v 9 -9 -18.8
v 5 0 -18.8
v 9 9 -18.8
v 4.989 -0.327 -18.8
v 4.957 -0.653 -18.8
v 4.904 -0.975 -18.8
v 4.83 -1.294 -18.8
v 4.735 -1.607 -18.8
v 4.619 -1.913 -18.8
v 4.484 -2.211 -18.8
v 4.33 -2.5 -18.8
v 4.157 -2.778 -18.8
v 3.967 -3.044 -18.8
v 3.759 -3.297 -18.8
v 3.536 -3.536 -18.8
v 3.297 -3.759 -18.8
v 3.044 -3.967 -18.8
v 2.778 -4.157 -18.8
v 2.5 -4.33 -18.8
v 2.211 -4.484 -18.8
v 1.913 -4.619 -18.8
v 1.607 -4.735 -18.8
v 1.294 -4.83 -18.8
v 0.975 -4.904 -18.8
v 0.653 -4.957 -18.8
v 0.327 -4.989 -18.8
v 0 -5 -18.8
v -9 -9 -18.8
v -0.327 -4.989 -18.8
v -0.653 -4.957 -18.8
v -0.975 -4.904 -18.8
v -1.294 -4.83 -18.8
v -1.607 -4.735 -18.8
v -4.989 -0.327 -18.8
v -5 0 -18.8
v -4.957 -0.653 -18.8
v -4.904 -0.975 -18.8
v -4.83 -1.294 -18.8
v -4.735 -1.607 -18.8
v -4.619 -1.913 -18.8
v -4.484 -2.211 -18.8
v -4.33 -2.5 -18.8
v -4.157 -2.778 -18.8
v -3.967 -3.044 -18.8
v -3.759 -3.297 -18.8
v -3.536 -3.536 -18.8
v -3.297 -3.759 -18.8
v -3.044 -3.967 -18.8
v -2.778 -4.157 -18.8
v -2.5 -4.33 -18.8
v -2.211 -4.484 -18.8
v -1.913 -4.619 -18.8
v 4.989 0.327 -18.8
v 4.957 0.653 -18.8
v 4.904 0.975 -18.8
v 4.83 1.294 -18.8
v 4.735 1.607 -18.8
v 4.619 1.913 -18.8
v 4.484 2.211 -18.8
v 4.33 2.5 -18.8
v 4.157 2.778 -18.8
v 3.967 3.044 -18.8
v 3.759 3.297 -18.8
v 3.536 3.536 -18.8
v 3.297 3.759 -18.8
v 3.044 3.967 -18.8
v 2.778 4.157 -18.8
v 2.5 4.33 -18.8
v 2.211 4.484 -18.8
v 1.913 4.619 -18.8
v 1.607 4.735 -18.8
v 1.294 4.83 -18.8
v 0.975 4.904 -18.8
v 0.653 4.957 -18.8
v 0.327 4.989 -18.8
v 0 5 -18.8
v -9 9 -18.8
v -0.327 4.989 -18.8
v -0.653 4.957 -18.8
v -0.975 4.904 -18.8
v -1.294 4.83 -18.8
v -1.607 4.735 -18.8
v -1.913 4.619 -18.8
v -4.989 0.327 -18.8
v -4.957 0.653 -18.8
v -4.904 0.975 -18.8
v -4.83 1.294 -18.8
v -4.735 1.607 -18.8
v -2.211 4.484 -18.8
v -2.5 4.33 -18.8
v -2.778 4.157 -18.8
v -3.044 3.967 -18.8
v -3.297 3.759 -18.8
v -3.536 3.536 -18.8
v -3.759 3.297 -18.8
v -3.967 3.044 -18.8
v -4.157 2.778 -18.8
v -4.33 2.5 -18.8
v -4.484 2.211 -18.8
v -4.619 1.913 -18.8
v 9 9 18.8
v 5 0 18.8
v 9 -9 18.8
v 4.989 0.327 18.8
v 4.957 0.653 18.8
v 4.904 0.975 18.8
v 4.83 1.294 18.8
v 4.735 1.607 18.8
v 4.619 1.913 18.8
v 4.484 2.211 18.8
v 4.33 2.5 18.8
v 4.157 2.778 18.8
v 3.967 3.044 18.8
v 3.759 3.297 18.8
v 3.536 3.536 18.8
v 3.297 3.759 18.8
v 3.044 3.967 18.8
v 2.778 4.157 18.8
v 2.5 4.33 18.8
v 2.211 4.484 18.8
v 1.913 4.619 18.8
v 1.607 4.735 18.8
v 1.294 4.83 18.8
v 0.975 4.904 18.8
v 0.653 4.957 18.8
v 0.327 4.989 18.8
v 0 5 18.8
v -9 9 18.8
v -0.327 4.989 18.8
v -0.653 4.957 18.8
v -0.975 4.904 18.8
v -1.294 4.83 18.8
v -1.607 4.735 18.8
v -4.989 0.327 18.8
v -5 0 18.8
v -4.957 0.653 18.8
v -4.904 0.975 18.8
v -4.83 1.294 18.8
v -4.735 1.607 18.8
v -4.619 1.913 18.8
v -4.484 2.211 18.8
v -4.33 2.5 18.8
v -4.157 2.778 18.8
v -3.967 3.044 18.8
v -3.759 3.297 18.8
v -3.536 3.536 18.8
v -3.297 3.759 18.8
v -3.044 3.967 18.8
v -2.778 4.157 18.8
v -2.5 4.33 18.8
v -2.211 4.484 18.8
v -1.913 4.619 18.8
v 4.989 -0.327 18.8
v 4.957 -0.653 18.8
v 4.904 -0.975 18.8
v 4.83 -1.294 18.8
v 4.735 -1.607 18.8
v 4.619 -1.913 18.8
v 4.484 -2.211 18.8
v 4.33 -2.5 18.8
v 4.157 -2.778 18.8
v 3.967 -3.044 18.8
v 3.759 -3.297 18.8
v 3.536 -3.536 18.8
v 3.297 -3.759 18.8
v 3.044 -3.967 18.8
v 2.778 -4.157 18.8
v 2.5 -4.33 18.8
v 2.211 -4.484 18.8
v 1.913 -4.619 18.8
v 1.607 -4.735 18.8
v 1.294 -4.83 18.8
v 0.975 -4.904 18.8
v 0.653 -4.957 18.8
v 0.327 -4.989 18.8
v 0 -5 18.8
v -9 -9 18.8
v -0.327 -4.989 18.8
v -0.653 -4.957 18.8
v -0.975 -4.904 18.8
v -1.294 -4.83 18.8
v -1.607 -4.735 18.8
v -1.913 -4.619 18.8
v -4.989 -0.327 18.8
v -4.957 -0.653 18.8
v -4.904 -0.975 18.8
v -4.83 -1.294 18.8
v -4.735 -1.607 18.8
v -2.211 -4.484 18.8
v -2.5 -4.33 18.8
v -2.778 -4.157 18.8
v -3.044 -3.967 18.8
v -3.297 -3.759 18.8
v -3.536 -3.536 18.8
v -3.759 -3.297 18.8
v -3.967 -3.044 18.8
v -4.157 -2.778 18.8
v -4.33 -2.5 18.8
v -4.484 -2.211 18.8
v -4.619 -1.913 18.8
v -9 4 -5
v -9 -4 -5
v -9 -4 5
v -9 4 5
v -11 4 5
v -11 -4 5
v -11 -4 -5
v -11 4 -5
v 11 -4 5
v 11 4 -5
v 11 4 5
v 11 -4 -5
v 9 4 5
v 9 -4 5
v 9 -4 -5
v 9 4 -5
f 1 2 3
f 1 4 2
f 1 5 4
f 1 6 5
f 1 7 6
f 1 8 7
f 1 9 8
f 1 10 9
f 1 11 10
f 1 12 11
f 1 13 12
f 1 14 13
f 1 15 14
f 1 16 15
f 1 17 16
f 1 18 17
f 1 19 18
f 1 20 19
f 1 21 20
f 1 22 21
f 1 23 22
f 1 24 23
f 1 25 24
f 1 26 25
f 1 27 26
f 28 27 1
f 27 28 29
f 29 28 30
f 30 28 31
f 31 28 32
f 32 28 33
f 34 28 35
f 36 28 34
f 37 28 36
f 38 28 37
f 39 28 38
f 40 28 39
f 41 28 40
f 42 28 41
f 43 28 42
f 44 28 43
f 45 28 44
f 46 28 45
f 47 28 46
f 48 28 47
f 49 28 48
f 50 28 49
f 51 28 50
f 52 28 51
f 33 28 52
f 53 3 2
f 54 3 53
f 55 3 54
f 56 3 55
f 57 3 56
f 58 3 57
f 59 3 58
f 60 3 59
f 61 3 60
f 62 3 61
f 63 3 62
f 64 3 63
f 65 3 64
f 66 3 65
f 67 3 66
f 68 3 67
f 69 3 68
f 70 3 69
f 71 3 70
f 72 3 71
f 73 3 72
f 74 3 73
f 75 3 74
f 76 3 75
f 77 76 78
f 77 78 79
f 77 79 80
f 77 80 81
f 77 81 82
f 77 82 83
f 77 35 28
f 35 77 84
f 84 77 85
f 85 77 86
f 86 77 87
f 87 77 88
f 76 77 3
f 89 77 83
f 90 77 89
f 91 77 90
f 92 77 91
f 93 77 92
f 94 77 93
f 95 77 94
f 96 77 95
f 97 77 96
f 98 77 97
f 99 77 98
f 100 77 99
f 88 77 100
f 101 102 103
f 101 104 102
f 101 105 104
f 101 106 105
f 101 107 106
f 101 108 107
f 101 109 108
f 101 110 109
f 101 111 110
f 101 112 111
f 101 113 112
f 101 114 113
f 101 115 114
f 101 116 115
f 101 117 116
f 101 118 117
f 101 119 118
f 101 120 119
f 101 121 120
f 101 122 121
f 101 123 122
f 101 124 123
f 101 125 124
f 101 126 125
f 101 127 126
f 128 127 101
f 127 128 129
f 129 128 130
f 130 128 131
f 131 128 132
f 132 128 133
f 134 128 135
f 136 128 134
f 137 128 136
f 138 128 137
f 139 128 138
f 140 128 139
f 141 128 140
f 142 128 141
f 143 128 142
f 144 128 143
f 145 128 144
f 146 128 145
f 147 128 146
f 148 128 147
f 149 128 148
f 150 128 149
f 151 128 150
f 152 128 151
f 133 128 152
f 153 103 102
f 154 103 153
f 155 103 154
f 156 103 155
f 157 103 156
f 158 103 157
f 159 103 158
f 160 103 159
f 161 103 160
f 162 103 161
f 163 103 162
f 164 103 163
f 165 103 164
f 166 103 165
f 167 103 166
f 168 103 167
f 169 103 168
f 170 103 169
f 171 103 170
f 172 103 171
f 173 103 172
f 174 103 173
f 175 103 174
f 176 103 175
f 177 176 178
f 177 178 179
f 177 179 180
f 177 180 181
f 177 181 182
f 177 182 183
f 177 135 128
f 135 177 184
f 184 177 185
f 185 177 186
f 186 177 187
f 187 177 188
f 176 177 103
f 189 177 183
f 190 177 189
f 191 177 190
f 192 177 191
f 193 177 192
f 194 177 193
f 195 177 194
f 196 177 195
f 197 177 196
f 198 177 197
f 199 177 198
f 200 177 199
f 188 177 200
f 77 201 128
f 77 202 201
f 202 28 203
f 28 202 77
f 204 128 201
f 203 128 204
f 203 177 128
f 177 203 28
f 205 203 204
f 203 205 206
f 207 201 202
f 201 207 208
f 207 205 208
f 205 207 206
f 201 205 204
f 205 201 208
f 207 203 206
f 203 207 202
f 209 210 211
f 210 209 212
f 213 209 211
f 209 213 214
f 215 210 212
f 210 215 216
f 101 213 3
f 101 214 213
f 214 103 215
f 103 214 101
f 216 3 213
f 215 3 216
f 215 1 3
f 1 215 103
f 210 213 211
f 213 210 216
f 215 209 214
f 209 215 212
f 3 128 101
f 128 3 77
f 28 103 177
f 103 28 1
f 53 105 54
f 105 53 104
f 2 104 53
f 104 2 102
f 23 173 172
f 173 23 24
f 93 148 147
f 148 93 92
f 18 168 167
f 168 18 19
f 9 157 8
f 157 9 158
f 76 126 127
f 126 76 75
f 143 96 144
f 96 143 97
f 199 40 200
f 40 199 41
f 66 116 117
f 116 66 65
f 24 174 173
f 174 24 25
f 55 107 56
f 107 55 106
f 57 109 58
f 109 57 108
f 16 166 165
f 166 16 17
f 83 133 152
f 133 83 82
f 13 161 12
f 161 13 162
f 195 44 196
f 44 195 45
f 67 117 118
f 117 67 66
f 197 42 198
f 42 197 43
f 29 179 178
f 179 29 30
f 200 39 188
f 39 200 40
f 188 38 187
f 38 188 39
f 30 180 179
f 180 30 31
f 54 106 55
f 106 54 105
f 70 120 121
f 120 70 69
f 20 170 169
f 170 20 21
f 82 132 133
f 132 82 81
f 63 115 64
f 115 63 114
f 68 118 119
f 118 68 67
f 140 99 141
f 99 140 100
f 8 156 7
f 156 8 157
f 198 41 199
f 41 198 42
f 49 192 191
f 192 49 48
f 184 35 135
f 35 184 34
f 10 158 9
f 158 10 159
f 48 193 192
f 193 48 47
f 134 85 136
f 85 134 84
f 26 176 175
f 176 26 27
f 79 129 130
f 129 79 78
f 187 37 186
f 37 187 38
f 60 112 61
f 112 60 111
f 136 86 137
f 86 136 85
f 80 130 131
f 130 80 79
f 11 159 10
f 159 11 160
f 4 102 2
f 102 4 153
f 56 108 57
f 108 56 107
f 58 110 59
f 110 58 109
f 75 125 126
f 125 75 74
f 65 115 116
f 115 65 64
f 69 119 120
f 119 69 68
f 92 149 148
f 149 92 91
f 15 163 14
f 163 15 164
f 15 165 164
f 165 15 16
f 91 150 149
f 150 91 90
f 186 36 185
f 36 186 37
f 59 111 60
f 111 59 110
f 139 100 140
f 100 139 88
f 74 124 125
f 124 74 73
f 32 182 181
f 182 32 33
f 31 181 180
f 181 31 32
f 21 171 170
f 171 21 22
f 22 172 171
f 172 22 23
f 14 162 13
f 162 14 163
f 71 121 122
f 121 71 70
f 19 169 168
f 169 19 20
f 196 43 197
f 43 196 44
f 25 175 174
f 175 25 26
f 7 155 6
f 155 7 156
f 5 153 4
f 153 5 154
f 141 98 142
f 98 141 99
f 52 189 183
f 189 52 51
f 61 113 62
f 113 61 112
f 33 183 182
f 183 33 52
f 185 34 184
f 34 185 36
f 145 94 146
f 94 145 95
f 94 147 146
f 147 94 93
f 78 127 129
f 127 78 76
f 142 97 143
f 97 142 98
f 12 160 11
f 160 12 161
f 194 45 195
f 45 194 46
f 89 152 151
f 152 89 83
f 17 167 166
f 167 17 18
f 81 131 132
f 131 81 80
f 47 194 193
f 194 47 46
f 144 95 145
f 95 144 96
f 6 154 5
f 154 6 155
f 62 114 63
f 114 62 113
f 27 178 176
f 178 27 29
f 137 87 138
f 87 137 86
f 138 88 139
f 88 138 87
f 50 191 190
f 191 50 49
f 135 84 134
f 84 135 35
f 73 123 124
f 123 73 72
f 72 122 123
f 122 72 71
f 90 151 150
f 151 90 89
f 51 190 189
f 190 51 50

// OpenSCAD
$fn=96;

bbox = [22.0, 22.0, 37.6];

body_xy = 18.0;
body_z  = bbox[2];

tab_w = 10.0;
tab_d = 2.0;
tab_h = 3.0;

side_w = 2.0;
side_d = 8.0;
side_h = 10.0;

bore_d = 10.0;

module main_body() {
    cube([body_xy, body_xy, body_z], center=true);
}

module top_bottom_tabs() {
    for (s = [-1, 1]) {
        translate([0, 0, s*(body_z/2 - tab_h/2)])
            cube([tab_w, tab_d, tab_h], center=true);
    }
}

module left_right_keys() {
    for (s = [-1, 1]) {
        translate([s*(body_xy/2 + side_w/2), 0, 0])
            cube([side_w, side_d, side_h], center=true);
    }
}

module outer_shape() {
    union() {
        main_body();
        top_bottom_tabs();
        left_right_keys();
    }
}

module bore() {
    cylinder(d=bore_d, h=body_z + 0.4, center=true);
}

difference() {
    outer_shape();
    bore();
}
